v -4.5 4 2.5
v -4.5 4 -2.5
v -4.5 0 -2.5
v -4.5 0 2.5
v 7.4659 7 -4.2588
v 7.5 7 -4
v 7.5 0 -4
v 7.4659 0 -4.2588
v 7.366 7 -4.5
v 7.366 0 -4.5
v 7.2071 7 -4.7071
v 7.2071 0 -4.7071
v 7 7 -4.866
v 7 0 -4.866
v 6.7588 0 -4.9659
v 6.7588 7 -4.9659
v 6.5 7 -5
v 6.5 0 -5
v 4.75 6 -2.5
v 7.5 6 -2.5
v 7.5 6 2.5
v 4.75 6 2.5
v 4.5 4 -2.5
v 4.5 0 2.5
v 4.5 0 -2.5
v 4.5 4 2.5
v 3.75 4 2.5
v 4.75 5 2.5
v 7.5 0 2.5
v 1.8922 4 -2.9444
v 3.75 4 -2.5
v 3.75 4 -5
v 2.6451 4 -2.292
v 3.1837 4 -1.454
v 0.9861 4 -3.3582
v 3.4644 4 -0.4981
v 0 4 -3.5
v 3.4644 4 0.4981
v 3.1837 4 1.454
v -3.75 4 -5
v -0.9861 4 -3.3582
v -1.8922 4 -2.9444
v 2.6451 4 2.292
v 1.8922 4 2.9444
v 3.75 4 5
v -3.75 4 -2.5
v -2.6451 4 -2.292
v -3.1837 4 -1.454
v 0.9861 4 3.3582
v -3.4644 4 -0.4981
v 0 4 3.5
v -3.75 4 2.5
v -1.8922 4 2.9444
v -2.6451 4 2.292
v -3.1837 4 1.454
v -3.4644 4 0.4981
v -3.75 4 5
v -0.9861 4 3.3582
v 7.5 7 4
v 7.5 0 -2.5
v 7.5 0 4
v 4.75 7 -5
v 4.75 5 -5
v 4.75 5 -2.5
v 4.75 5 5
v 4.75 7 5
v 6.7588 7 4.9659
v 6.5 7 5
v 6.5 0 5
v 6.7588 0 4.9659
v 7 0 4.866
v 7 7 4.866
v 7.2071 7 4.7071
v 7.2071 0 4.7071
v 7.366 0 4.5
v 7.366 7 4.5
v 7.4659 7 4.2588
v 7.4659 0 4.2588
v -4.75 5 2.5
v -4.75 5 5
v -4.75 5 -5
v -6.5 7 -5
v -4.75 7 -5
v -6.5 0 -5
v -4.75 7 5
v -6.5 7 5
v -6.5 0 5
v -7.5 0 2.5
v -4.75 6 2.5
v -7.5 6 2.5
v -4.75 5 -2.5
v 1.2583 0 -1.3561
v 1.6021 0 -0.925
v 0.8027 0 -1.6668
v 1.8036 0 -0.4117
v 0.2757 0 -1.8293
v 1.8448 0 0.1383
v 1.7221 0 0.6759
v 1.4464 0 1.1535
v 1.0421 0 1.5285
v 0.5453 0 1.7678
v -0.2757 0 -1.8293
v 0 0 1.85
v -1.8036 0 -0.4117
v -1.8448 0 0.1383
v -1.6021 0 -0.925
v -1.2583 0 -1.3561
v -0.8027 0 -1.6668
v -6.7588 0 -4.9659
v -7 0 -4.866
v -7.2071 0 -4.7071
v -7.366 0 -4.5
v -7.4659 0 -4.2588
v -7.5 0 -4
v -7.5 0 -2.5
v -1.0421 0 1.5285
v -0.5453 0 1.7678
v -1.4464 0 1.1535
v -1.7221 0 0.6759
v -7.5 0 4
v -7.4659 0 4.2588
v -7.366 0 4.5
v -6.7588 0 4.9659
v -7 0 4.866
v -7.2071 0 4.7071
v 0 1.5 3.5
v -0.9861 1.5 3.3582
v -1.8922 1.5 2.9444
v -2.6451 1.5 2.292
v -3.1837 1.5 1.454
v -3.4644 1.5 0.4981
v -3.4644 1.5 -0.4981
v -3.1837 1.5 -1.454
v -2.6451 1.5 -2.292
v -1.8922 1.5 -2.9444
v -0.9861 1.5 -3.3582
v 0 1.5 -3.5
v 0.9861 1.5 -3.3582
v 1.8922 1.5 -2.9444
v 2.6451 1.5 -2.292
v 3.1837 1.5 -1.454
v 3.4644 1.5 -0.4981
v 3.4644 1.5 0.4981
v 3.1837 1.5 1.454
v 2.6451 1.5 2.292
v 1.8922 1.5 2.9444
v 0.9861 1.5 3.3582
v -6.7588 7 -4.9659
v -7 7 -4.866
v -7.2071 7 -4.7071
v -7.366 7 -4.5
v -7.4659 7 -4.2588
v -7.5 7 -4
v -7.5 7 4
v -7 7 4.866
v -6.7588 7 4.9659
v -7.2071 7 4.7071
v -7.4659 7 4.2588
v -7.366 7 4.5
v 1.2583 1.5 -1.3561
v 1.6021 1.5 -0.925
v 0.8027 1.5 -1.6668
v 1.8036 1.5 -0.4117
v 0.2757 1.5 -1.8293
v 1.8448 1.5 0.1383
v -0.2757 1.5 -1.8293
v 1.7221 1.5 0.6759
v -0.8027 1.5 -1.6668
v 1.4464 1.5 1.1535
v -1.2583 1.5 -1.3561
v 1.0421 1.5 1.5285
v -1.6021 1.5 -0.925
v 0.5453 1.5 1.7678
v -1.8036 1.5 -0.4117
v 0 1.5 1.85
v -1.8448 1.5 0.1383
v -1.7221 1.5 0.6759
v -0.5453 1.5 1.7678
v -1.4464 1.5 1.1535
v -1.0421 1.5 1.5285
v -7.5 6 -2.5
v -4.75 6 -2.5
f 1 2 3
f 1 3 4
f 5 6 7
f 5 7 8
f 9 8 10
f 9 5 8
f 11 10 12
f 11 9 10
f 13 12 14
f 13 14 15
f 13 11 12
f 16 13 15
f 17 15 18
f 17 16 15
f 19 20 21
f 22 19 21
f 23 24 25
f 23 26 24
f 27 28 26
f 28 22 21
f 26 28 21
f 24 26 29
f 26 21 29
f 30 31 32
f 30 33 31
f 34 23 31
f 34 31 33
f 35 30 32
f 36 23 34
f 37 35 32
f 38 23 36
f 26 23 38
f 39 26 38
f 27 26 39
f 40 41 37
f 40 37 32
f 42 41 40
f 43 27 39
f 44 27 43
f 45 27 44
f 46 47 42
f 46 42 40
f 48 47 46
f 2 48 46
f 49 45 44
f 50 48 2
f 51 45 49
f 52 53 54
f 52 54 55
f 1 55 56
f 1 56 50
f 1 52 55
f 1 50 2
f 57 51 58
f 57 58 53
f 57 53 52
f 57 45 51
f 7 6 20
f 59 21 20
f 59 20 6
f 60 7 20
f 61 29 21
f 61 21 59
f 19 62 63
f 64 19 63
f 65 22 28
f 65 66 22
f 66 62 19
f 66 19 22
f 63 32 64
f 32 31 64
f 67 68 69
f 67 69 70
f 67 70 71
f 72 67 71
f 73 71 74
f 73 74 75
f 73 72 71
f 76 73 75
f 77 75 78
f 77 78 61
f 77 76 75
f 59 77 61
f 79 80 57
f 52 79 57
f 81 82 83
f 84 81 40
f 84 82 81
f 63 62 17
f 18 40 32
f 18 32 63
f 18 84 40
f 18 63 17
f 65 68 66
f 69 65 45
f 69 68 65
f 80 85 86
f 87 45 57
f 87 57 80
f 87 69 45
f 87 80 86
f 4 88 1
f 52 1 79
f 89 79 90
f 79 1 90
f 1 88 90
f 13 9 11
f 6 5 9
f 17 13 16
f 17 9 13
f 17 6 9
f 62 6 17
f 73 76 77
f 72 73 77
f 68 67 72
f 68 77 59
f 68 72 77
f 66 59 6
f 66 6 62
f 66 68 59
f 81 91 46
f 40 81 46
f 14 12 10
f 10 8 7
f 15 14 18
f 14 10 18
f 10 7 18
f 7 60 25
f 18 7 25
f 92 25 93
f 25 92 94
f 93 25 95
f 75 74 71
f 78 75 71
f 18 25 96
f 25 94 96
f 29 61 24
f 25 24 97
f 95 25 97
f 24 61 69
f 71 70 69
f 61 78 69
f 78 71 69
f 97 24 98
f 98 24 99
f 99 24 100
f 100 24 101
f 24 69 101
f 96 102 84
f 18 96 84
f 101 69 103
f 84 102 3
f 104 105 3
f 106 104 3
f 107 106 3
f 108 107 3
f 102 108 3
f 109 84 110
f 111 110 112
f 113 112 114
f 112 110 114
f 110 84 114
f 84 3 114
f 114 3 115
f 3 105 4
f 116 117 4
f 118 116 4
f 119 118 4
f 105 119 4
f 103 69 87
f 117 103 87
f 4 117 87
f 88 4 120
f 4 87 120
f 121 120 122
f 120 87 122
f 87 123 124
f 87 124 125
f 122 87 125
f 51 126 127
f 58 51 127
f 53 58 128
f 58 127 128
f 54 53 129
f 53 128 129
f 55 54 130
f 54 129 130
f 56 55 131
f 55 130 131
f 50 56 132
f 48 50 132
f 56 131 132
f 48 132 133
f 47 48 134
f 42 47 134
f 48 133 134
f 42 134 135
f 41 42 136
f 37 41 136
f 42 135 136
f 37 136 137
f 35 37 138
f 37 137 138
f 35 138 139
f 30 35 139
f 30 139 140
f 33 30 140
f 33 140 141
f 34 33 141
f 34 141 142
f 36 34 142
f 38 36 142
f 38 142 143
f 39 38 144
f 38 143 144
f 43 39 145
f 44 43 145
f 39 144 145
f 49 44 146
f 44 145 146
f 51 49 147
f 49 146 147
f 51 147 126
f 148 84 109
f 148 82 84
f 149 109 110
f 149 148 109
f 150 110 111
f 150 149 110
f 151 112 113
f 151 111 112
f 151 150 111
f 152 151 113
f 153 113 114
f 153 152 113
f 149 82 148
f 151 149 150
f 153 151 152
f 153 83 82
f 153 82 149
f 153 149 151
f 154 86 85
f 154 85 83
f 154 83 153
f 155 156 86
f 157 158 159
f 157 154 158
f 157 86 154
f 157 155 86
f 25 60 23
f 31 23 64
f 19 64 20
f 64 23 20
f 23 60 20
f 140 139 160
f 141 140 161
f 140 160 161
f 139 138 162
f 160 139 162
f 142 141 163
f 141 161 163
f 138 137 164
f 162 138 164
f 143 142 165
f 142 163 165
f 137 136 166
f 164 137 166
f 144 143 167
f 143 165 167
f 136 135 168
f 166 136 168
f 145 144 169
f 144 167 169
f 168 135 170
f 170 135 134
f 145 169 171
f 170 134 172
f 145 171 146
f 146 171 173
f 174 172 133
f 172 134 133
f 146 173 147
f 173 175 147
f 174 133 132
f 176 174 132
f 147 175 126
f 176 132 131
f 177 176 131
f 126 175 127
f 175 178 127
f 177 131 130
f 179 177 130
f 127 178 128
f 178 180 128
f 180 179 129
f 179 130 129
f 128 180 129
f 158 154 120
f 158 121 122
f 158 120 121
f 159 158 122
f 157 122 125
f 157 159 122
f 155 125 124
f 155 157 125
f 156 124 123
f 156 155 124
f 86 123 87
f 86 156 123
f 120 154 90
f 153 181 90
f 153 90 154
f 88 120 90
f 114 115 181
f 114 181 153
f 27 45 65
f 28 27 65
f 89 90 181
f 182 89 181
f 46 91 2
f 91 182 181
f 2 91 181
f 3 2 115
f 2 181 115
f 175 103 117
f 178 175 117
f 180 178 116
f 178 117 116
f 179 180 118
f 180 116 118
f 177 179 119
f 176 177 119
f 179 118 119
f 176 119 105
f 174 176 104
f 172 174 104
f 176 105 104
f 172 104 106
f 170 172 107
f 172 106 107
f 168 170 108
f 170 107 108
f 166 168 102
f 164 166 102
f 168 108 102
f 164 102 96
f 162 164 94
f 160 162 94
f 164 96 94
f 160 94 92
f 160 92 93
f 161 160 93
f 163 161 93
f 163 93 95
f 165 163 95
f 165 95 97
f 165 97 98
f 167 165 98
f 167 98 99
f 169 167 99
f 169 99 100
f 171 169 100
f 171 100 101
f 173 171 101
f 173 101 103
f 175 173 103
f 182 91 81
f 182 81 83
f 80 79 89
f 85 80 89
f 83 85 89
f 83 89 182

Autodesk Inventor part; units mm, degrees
ref_plane "YZ Plane" through (0, 0, 0) normal (1, 0, 0) x (0, 1, 0)
ref_plane "XZ Plane" through (0, 0, 0) normal (0, 1, 0) x (-1, 0, 0)
ref_plane "XY Plane" through (0, 0, 0) normal (0, 0, 1) x (1, 0, 0)
sketch "Náčrt6" plane through (0, 0, 0) normal (0, 1, 0) x (-1, 0, 0)
  line L0 (-7.5, 5) -> (7.5, 5)
  line L1 (7.5, 5) -> (7.5, -5)
  line L2 (7.5, -5) -> (-7.5, -5)
  line L3 (-7.5, -5) -> (-7.5, 5)
  line L4 (-7.5, 5) -> (7.5, -5) construction
  line L5 (7.5, 5) -> (-7.5, -5) construction
  point P0 (0, 0)
  dimension "d10" = 15
  dimension "d11" = 10
extrude "Vysunutí6" add sketch "Náčrt6" along normal blind 7
sketch "Náčrt7" plane through (0, 0, 0) normal (0, 0, 1) x (1, 0, 0)
  line L0 (0, 8.4) -> (0, -1.4) projected
  line L1 (-10.5, 0) -> (10.5, 0) projected
  line L2 (-4.75, 7) -> (4.75, 7)
  line L3 (4.75, 7) -> (4.75, 5)
  line L4 (3.75, 4) -> (-3.75, 4)
  line L5 (-4.75, 5) -> (-4.75, 7)
  line L6 (7.5, 7) -> (-7.5, 7) projected
  line L7 (-4.75, 5) -> (-3.75, 4)
  line L8 (3.75, 4) -> (4.75, 5)
  point P0 (0, 0)
  point P1 (4.75, 4)
  point P2 (-4.75, 4)
  dimension "d14" = 9.5
  dimension "d15" = 3
  dimension "d16" = 1
  dimension "d17" = 1
  dimension "d18" = 1
  dimension "d19" = 1
extrude "Vysunutí7" cut sketch "Náčrt7" against normal through all both and the other way through all
sketch "Náčrt8" plane through (7.5, 0, 5) normal (1, 0, 0) x (0, 0, -1)
  line L0 (0, 0) -> (10, 0) projected
  line L1 (2.5, 0) -> (7.5, 0)
  line L2 (7.5, 0) -> (7.5, 6)
  line L3 (7.5, 6) -> (2.5, 6)
  line L4 (2.5, 6) -> (2.5, 0)
  line L5 (-2, 0) -> (12, 0) projected
  line L6 (5, -1.4) -> (5, 8.4) projected
  point P0 (5, 0)
  dimension "d22" = 5
  dimension "d23" = 6
extrude "Vysunutí8" cut sketch "Náčrt8" against normal blind 3
mirror "Zrcadlit1" about plane through (0, 0, 0) normal (1, 0, 0) of "Vysunutí8"
sketch "Náčrt9" plane through (4.5, 0, 5) normal (1, 0, 0) x (0, 0, -1)
  line L0 (2.5, 4.75) -> (7.5, 4.75) projected
  line L1 (2.5, 0) -> (2.5, 4.75) projected
  line L2 (7.5, 0) -> (2.5, 0) projected
  line L3 (7.5, 4.75) -> (7.5, 0) projected
  line L4 (10, 4) -> (0, 4) projected
  point P0 (5, 0)
  point P1 (2.5, 4)
  point P2 (7.5, 4)
extrude "Vysunutí9" cut sketch "Náčrt9" against normal through all contours L0 L3 L4 L1
sketch "Náčrt10" plane through (-3.75, 4, -5) normal (0, 1, 0) x (1, 0, 0)
  point P0 (3.75, -5)
hole "Díra1" at (0, 4, 0) direction (0, -1, 0) diameter 3.7 end through all counterbore diameter 7 counterbore depth 2.5
fillet "Zaoblení1" radius 1 4 edges at (7.5, 3.5, -5) (7.5, 3.5, 5) (-7.5, 3.5, -5) (-7.5, 3.5, 5)
equation "\"d17\" = d16"
equation "\"d18\" = d16"
equation "\"d19\" = d18"
equation "\"Milimetr\" = 1"
properties part number "Příchytka pásků, pro M3, přírodní bílá" material "Plast, neprůhledný bílý"
